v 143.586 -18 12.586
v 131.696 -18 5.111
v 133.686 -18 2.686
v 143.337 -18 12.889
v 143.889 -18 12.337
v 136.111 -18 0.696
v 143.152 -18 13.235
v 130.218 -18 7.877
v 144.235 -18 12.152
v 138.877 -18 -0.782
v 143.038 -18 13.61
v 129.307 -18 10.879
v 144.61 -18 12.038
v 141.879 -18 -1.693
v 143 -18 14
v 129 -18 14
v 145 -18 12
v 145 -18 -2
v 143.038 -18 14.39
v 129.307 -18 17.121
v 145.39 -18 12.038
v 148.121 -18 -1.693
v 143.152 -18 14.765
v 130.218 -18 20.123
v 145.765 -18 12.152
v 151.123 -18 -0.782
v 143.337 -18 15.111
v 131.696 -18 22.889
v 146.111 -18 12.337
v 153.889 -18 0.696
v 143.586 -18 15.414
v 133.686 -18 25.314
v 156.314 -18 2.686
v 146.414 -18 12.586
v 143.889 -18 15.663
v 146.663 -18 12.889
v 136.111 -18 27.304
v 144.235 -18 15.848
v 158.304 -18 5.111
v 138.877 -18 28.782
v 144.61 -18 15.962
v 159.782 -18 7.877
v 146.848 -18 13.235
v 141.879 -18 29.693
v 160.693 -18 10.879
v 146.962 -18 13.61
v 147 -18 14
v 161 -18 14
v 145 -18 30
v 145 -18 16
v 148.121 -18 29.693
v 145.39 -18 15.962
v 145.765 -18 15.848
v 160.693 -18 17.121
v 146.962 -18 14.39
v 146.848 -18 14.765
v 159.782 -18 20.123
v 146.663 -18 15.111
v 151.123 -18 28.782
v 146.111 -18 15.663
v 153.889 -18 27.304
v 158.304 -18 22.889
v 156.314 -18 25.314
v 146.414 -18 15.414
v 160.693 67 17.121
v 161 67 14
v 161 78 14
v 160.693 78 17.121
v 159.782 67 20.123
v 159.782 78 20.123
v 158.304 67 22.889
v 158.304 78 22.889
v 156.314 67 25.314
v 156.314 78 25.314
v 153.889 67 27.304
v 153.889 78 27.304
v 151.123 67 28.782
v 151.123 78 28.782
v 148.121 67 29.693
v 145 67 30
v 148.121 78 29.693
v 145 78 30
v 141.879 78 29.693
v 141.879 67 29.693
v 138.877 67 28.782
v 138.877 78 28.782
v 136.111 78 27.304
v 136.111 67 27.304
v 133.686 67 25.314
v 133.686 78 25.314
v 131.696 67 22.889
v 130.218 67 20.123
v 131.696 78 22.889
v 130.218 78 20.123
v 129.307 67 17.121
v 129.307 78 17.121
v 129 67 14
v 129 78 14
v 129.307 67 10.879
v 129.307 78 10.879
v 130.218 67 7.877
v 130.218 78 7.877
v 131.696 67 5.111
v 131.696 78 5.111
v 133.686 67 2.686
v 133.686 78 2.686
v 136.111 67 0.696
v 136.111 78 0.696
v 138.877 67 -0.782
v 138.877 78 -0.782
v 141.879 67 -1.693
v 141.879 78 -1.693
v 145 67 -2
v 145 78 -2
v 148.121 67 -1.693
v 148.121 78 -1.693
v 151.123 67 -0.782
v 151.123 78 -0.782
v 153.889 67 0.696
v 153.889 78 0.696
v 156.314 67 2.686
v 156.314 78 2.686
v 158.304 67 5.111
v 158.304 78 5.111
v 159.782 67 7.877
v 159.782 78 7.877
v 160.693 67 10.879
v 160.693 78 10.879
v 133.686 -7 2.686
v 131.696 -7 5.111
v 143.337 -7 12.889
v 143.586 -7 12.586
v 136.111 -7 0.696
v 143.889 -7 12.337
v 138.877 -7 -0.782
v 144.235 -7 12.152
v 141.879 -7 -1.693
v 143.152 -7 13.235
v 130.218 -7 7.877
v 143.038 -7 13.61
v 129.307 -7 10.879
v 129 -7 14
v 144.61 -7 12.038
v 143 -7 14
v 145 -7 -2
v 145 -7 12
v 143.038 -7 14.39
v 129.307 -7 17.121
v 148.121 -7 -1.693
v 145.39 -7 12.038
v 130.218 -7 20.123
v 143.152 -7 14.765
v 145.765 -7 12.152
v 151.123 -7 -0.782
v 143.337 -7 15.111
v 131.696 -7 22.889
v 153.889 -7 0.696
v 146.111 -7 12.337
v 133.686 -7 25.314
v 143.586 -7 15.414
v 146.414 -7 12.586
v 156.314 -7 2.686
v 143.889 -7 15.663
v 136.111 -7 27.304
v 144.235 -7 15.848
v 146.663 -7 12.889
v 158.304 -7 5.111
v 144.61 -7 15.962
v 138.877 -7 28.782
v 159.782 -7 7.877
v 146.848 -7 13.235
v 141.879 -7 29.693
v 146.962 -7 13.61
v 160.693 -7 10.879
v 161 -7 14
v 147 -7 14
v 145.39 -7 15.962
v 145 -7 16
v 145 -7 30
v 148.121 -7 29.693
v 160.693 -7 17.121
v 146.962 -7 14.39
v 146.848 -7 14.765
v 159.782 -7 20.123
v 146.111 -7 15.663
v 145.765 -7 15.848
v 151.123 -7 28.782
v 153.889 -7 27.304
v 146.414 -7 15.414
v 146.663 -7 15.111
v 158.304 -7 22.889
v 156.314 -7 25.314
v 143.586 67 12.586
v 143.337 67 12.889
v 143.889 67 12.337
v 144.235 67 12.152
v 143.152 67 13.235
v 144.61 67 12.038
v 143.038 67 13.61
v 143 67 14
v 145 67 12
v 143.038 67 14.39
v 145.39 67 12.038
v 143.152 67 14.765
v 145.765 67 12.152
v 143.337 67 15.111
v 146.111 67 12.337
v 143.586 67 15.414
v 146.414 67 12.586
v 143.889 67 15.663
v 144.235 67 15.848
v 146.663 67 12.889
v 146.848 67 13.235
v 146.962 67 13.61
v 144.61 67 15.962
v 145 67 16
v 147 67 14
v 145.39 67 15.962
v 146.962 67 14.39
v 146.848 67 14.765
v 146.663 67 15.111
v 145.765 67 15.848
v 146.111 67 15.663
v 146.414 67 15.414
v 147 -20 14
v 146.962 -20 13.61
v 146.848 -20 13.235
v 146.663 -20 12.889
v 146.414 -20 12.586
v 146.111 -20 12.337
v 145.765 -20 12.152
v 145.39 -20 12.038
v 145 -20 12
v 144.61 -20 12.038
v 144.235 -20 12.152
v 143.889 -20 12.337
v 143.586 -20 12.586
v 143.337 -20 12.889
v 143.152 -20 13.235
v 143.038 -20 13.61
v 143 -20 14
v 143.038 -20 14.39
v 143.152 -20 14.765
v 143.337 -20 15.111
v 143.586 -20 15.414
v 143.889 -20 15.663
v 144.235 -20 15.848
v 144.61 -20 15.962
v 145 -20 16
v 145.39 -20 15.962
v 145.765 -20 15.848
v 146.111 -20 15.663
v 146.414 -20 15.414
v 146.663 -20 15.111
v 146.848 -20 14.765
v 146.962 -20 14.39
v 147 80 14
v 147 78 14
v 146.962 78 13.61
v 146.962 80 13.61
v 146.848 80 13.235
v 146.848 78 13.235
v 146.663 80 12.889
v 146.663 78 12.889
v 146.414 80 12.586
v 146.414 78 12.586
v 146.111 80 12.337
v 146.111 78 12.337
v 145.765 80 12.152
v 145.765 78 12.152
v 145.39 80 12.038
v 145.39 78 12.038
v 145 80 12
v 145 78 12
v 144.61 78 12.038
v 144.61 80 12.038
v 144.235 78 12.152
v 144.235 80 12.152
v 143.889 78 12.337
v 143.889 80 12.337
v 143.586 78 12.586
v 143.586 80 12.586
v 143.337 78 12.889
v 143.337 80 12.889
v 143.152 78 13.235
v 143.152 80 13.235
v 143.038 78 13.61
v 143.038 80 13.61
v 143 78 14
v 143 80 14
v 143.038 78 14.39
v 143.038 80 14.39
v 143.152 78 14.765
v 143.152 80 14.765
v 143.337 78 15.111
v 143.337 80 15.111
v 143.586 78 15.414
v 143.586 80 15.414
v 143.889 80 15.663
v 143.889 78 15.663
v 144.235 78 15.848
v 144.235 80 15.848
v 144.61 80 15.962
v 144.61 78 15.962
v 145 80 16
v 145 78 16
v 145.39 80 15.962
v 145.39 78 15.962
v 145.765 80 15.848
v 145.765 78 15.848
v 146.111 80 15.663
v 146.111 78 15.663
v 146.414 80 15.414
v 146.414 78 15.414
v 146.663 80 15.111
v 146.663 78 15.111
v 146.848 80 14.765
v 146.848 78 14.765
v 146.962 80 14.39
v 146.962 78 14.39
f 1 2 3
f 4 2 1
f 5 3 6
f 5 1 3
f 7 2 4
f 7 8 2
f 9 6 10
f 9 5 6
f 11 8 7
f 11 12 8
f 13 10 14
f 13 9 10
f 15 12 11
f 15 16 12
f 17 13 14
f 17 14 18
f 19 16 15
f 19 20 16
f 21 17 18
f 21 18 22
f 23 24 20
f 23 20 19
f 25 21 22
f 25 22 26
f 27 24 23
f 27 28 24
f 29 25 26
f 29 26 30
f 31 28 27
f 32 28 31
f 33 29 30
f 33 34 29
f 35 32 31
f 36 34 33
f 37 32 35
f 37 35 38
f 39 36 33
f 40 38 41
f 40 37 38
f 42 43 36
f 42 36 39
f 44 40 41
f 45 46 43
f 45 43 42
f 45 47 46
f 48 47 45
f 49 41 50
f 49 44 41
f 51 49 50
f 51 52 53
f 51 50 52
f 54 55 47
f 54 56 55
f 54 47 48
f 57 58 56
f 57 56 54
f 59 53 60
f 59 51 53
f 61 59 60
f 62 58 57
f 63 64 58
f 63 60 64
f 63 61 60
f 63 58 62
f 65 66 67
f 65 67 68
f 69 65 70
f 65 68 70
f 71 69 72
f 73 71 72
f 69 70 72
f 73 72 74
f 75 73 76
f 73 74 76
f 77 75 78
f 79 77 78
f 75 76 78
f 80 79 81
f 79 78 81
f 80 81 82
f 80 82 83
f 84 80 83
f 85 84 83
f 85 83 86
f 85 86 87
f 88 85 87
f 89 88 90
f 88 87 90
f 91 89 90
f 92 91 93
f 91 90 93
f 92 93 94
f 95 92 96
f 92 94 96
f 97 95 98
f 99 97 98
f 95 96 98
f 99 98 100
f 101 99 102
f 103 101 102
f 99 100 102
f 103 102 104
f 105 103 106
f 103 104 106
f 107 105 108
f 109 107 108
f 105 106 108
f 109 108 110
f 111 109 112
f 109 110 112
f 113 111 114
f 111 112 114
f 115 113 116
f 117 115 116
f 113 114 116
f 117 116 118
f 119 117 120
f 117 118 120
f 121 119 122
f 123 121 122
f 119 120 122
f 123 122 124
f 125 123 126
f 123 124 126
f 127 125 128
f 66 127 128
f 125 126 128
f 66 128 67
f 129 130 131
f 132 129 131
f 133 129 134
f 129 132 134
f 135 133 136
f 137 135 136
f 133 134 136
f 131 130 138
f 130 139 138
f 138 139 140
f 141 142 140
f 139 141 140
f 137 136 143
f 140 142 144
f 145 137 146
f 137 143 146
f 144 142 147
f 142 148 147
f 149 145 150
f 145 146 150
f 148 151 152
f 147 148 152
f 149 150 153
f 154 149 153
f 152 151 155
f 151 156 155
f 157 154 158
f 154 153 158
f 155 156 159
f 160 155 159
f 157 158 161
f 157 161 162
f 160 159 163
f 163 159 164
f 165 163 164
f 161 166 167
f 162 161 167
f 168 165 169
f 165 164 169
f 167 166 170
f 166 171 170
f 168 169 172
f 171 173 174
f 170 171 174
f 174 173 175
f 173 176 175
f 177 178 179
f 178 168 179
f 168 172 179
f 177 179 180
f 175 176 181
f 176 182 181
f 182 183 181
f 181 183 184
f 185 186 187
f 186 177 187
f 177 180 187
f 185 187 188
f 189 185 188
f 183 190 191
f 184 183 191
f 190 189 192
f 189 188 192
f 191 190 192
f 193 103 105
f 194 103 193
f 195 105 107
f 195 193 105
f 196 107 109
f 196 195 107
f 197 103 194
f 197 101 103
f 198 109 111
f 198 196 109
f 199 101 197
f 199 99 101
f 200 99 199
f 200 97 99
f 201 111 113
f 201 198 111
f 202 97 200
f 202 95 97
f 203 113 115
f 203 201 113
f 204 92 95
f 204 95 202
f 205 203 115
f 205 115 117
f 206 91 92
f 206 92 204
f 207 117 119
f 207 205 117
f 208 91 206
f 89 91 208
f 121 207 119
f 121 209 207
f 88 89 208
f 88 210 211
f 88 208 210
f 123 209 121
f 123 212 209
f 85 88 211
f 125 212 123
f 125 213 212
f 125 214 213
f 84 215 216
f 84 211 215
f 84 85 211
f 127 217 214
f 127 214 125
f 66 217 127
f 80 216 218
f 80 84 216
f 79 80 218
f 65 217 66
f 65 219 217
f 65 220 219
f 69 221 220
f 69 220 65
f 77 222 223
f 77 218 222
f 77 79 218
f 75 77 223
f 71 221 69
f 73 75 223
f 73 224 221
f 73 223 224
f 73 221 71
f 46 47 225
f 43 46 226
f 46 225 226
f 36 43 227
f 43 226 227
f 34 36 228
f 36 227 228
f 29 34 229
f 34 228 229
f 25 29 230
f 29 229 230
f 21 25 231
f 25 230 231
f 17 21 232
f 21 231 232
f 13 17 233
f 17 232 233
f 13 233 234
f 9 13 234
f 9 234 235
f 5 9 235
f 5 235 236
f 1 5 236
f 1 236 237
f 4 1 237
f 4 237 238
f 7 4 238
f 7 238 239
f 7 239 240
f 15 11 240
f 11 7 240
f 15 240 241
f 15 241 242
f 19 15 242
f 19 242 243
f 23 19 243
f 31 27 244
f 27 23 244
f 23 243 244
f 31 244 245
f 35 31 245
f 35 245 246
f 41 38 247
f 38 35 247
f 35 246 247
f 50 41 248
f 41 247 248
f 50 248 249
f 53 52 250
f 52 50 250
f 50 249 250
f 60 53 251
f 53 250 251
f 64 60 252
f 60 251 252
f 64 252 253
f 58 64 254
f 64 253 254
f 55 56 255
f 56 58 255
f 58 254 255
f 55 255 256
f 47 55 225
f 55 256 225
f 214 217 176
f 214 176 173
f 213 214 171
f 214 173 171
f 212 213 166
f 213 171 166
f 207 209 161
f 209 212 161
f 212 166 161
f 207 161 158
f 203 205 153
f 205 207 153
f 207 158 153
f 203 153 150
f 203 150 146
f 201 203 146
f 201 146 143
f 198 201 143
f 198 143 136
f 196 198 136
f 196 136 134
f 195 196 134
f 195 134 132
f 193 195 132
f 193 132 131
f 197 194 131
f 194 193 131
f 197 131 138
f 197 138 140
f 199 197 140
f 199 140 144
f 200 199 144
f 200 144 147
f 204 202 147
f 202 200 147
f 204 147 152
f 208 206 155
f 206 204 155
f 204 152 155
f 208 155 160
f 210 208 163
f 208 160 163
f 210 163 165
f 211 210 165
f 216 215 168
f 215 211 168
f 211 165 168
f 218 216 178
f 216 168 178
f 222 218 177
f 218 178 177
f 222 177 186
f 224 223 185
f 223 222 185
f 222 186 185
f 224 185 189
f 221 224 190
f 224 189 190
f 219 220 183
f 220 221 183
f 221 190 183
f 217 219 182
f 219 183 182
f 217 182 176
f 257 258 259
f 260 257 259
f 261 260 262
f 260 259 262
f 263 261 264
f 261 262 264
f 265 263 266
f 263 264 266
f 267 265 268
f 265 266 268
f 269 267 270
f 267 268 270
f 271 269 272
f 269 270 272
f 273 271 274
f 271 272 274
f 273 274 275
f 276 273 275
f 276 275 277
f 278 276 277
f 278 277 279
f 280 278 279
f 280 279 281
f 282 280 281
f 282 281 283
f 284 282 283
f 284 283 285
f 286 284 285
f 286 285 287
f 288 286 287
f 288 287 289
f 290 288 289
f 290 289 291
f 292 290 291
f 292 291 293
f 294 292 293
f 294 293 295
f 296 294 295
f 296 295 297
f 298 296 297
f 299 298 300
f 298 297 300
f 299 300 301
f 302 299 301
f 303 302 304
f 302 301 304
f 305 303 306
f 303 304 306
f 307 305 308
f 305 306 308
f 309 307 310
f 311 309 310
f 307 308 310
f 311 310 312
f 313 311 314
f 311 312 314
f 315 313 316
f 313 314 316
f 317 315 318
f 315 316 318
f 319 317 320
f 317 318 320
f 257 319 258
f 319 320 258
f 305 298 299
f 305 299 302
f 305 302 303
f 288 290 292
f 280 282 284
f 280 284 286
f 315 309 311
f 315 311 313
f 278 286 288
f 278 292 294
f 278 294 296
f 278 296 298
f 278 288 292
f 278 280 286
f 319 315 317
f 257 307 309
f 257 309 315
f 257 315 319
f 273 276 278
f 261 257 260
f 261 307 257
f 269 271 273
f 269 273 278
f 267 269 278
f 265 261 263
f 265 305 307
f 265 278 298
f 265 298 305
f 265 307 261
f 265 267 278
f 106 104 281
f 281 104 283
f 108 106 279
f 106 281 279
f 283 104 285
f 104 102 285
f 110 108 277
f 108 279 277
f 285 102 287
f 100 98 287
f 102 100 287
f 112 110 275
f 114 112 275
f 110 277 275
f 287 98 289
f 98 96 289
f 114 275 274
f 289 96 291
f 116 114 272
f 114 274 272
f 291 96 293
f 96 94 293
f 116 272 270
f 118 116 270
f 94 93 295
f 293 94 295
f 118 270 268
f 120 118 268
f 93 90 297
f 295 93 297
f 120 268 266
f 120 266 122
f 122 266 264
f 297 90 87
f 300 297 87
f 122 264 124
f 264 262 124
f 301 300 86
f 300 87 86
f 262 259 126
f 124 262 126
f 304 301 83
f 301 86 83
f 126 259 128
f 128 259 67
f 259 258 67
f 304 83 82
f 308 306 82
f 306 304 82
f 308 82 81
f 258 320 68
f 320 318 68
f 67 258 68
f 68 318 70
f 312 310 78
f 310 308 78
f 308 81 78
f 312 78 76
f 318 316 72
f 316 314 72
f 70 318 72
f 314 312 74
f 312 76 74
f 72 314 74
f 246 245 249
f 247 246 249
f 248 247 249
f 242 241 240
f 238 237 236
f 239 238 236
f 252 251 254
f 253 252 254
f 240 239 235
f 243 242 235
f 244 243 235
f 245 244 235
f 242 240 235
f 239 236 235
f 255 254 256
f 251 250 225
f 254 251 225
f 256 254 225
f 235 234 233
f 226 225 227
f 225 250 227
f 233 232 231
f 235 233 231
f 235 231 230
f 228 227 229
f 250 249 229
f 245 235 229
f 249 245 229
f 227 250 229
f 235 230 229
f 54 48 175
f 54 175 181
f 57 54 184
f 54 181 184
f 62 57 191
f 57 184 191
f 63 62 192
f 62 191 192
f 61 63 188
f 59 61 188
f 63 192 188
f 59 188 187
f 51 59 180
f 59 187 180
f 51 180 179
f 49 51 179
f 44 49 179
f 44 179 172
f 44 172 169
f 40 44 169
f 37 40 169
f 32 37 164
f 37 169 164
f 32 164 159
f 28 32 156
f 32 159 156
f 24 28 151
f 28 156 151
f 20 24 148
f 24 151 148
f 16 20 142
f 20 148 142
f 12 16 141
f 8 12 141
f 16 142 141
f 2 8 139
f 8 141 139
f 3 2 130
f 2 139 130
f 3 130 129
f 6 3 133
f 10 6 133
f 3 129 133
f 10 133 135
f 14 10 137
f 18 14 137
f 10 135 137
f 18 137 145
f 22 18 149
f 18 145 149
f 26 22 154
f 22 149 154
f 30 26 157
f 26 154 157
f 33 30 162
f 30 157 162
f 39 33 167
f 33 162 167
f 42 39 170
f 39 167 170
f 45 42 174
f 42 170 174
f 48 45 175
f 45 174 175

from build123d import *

# Parameters (mm, degrees)
CYLINDER002_R             = 16
CYLINDER002_DEPTH         = 11
CYLINDER002_ROLL_ANGLE    = 90
CYLINDER002001_R          = 16
CYLINDER002001_DEPTH      = 11
CYLINDER002001_ROLL_ANGLE = 90
CYLINDER_R                = 2
CYLINDER_DEPTH            = 100
CYLINDER_ROLL_ANGLE       = -90


with BuildPart() as wheel1:
    # Cylinder002 → Cylinder002 (new body)
    with BuildSketch(Plane.XY):
        Circle(CYLINDER002_R)
    extrude(amount=CYLINDER002_DEPTH)


with BuildPart() as wheel1_1:
    # Cylinder002 roll: moved
    add(wheel1.part.rotate(Axis((0, 0, 0), (1, 0, 0)), CYLINDER002_ROLL_ANGLE))


with BuildPart() as wheel1_2:
    # Cylinder002 placement: moved
    add(wheel1_1.part.moved(Location((20, -7, 14))))


with BuildPart() as wheel2:
    # Cylinder002001 → Cylinder002001 (new body)
    with BuildSketch(Plane.XY):
        Circle(CYLINDER002001_R)
    extrude(amount=CYLINDER002001_DEPTH)


with BuildPart() as wheel2_1:
    # Cylinder002001 roll: moved
    add(wheel2.part.rotate(Axis((0, 0, 0), (1, 0, 0)), CYLINDER002001_ROLL_ANGLE))


with BuildPart() as wheel2_2:
    # Cylinder002001 placement: moved
    add(wheel2_1.part.moved(Location((20, 78, 14))))


with BuildPart() as wheelset2:
    # Cylinder → Cylinder (new body)
    with BuildSketch(Plane.XY):
        Circle(CYLINDER_R)
    extrude(amount=CYLINDER_DEPTH)


with BuildPart() as wheelset2_1:
    # Cylinder roll: moved
    add(wheelset2.part.rotate(Axis((0, 0, 0), (1, 0, 0)), CYLINDER_ROLL_ANGLE))


with BuildPart() as wheelset2_2:
    # Cylinder placement: moved
    add(wheelset2_1.part.moved(Location((20, -20, 14))))

    # Fusion001: union Wheel1, Wheel2
    add(wheel1_2.part)
    add(wheel2_2.part)


with BuildPart() as wheelset2_3:
    # Fusion001 placement: moved
    add(wheelset2_2.part.moved(Location((125, 0, 0))))


solid = wheelset2_3.part
